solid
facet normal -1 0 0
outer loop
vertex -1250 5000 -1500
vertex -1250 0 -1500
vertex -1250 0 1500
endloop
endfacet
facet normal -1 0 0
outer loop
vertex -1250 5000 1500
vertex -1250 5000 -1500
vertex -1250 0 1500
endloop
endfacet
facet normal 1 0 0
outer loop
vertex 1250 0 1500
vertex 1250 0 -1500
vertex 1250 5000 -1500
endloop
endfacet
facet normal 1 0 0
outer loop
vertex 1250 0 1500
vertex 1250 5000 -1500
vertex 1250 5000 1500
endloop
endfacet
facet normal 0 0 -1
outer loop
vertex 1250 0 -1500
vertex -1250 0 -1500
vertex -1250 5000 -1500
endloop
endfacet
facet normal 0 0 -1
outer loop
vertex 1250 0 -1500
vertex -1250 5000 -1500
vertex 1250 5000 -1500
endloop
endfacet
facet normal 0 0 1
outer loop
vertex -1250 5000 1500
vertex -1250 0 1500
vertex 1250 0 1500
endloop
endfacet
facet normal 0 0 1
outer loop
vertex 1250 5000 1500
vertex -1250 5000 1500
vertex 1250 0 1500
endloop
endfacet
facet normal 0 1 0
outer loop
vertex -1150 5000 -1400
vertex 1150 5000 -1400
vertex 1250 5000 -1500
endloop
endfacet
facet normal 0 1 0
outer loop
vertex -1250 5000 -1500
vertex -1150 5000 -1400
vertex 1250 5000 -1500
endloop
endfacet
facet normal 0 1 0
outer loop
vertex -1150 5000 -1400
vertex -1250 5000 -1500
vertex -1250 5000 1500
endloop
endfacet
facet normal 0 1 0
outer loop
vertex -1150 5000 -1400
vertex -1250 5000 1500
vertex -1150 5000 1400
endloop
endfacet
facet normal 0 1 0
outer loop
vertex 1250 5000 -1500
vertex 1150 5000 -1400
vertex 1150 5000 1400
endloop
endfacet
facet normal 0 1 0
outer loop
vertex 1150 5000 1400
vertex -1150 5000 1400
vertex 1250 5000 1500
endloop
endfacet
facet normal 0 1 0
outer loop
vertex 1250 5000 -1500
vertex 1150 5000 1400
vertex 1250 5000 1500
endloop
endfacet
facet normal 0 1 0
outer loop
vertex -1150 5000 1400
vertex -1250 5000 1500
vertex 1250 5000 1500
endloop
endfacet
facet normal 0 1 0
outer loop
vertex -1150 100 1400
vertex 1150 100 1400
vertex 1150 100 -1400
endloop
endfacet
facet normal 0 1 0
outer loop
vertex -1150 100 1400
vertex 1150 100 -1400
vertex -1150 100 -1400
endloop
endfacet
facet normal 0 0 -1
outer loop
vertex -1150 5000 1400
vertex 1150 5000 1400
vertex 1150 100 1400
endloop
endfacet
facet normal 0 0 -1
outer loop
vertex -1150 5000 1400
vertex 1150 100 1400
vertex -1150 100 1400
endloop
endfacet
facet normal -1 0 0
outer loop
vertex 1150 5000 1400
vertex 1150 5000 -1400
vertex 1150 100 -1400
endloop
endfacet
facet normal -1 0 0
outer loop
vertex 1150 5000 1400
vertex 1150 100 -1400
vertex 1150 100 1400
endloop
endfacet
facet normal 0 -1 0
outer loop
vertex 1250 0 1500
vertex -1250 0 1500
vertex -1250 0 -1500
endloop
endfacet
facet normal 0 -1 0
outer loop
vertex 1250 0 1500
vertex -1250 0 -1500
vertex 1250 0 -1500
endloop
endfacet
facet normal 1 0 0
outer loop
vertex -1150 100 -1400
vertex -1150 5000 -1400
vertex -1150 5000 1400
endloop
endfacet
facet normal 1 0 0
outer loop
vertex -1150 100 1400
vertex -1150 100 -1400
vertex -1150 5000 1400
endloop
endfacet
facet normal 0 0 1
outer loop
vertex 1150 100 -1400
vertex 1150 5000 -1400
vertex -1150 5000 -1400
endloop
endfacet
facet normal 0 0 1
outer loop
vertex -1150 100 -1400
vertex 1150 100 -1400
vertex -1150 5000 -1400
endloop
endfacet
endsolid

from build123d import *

# Parameters (mm, degrees)
F2_W     = 2500
F2_H     = 3000
F3_DEPTH = 5000
F4_W     = 2300
F4_H     = 2800
F5_DEPTH = 4900


with BuildPart() as f3:
    # F2 (on Front) → F3 (new body)
    with BuildSketch(Plane.XZ):
        Rectangle(F2_W, F2_H)
    extrude(amount=-F3_DEPTH)

    # F4 (on face) → F5 (cut)
    with BuildSketch(Plane(origin=(0, 5000, 0), x_dir=(-1, 0, 0), z_dir=(0, 1, 0))):
        Rectangle(F4_W, F4_H)
    extrude(amount=-F5_DEPTH, mode=Mode.SUBTRACT)


solid = f3.part
